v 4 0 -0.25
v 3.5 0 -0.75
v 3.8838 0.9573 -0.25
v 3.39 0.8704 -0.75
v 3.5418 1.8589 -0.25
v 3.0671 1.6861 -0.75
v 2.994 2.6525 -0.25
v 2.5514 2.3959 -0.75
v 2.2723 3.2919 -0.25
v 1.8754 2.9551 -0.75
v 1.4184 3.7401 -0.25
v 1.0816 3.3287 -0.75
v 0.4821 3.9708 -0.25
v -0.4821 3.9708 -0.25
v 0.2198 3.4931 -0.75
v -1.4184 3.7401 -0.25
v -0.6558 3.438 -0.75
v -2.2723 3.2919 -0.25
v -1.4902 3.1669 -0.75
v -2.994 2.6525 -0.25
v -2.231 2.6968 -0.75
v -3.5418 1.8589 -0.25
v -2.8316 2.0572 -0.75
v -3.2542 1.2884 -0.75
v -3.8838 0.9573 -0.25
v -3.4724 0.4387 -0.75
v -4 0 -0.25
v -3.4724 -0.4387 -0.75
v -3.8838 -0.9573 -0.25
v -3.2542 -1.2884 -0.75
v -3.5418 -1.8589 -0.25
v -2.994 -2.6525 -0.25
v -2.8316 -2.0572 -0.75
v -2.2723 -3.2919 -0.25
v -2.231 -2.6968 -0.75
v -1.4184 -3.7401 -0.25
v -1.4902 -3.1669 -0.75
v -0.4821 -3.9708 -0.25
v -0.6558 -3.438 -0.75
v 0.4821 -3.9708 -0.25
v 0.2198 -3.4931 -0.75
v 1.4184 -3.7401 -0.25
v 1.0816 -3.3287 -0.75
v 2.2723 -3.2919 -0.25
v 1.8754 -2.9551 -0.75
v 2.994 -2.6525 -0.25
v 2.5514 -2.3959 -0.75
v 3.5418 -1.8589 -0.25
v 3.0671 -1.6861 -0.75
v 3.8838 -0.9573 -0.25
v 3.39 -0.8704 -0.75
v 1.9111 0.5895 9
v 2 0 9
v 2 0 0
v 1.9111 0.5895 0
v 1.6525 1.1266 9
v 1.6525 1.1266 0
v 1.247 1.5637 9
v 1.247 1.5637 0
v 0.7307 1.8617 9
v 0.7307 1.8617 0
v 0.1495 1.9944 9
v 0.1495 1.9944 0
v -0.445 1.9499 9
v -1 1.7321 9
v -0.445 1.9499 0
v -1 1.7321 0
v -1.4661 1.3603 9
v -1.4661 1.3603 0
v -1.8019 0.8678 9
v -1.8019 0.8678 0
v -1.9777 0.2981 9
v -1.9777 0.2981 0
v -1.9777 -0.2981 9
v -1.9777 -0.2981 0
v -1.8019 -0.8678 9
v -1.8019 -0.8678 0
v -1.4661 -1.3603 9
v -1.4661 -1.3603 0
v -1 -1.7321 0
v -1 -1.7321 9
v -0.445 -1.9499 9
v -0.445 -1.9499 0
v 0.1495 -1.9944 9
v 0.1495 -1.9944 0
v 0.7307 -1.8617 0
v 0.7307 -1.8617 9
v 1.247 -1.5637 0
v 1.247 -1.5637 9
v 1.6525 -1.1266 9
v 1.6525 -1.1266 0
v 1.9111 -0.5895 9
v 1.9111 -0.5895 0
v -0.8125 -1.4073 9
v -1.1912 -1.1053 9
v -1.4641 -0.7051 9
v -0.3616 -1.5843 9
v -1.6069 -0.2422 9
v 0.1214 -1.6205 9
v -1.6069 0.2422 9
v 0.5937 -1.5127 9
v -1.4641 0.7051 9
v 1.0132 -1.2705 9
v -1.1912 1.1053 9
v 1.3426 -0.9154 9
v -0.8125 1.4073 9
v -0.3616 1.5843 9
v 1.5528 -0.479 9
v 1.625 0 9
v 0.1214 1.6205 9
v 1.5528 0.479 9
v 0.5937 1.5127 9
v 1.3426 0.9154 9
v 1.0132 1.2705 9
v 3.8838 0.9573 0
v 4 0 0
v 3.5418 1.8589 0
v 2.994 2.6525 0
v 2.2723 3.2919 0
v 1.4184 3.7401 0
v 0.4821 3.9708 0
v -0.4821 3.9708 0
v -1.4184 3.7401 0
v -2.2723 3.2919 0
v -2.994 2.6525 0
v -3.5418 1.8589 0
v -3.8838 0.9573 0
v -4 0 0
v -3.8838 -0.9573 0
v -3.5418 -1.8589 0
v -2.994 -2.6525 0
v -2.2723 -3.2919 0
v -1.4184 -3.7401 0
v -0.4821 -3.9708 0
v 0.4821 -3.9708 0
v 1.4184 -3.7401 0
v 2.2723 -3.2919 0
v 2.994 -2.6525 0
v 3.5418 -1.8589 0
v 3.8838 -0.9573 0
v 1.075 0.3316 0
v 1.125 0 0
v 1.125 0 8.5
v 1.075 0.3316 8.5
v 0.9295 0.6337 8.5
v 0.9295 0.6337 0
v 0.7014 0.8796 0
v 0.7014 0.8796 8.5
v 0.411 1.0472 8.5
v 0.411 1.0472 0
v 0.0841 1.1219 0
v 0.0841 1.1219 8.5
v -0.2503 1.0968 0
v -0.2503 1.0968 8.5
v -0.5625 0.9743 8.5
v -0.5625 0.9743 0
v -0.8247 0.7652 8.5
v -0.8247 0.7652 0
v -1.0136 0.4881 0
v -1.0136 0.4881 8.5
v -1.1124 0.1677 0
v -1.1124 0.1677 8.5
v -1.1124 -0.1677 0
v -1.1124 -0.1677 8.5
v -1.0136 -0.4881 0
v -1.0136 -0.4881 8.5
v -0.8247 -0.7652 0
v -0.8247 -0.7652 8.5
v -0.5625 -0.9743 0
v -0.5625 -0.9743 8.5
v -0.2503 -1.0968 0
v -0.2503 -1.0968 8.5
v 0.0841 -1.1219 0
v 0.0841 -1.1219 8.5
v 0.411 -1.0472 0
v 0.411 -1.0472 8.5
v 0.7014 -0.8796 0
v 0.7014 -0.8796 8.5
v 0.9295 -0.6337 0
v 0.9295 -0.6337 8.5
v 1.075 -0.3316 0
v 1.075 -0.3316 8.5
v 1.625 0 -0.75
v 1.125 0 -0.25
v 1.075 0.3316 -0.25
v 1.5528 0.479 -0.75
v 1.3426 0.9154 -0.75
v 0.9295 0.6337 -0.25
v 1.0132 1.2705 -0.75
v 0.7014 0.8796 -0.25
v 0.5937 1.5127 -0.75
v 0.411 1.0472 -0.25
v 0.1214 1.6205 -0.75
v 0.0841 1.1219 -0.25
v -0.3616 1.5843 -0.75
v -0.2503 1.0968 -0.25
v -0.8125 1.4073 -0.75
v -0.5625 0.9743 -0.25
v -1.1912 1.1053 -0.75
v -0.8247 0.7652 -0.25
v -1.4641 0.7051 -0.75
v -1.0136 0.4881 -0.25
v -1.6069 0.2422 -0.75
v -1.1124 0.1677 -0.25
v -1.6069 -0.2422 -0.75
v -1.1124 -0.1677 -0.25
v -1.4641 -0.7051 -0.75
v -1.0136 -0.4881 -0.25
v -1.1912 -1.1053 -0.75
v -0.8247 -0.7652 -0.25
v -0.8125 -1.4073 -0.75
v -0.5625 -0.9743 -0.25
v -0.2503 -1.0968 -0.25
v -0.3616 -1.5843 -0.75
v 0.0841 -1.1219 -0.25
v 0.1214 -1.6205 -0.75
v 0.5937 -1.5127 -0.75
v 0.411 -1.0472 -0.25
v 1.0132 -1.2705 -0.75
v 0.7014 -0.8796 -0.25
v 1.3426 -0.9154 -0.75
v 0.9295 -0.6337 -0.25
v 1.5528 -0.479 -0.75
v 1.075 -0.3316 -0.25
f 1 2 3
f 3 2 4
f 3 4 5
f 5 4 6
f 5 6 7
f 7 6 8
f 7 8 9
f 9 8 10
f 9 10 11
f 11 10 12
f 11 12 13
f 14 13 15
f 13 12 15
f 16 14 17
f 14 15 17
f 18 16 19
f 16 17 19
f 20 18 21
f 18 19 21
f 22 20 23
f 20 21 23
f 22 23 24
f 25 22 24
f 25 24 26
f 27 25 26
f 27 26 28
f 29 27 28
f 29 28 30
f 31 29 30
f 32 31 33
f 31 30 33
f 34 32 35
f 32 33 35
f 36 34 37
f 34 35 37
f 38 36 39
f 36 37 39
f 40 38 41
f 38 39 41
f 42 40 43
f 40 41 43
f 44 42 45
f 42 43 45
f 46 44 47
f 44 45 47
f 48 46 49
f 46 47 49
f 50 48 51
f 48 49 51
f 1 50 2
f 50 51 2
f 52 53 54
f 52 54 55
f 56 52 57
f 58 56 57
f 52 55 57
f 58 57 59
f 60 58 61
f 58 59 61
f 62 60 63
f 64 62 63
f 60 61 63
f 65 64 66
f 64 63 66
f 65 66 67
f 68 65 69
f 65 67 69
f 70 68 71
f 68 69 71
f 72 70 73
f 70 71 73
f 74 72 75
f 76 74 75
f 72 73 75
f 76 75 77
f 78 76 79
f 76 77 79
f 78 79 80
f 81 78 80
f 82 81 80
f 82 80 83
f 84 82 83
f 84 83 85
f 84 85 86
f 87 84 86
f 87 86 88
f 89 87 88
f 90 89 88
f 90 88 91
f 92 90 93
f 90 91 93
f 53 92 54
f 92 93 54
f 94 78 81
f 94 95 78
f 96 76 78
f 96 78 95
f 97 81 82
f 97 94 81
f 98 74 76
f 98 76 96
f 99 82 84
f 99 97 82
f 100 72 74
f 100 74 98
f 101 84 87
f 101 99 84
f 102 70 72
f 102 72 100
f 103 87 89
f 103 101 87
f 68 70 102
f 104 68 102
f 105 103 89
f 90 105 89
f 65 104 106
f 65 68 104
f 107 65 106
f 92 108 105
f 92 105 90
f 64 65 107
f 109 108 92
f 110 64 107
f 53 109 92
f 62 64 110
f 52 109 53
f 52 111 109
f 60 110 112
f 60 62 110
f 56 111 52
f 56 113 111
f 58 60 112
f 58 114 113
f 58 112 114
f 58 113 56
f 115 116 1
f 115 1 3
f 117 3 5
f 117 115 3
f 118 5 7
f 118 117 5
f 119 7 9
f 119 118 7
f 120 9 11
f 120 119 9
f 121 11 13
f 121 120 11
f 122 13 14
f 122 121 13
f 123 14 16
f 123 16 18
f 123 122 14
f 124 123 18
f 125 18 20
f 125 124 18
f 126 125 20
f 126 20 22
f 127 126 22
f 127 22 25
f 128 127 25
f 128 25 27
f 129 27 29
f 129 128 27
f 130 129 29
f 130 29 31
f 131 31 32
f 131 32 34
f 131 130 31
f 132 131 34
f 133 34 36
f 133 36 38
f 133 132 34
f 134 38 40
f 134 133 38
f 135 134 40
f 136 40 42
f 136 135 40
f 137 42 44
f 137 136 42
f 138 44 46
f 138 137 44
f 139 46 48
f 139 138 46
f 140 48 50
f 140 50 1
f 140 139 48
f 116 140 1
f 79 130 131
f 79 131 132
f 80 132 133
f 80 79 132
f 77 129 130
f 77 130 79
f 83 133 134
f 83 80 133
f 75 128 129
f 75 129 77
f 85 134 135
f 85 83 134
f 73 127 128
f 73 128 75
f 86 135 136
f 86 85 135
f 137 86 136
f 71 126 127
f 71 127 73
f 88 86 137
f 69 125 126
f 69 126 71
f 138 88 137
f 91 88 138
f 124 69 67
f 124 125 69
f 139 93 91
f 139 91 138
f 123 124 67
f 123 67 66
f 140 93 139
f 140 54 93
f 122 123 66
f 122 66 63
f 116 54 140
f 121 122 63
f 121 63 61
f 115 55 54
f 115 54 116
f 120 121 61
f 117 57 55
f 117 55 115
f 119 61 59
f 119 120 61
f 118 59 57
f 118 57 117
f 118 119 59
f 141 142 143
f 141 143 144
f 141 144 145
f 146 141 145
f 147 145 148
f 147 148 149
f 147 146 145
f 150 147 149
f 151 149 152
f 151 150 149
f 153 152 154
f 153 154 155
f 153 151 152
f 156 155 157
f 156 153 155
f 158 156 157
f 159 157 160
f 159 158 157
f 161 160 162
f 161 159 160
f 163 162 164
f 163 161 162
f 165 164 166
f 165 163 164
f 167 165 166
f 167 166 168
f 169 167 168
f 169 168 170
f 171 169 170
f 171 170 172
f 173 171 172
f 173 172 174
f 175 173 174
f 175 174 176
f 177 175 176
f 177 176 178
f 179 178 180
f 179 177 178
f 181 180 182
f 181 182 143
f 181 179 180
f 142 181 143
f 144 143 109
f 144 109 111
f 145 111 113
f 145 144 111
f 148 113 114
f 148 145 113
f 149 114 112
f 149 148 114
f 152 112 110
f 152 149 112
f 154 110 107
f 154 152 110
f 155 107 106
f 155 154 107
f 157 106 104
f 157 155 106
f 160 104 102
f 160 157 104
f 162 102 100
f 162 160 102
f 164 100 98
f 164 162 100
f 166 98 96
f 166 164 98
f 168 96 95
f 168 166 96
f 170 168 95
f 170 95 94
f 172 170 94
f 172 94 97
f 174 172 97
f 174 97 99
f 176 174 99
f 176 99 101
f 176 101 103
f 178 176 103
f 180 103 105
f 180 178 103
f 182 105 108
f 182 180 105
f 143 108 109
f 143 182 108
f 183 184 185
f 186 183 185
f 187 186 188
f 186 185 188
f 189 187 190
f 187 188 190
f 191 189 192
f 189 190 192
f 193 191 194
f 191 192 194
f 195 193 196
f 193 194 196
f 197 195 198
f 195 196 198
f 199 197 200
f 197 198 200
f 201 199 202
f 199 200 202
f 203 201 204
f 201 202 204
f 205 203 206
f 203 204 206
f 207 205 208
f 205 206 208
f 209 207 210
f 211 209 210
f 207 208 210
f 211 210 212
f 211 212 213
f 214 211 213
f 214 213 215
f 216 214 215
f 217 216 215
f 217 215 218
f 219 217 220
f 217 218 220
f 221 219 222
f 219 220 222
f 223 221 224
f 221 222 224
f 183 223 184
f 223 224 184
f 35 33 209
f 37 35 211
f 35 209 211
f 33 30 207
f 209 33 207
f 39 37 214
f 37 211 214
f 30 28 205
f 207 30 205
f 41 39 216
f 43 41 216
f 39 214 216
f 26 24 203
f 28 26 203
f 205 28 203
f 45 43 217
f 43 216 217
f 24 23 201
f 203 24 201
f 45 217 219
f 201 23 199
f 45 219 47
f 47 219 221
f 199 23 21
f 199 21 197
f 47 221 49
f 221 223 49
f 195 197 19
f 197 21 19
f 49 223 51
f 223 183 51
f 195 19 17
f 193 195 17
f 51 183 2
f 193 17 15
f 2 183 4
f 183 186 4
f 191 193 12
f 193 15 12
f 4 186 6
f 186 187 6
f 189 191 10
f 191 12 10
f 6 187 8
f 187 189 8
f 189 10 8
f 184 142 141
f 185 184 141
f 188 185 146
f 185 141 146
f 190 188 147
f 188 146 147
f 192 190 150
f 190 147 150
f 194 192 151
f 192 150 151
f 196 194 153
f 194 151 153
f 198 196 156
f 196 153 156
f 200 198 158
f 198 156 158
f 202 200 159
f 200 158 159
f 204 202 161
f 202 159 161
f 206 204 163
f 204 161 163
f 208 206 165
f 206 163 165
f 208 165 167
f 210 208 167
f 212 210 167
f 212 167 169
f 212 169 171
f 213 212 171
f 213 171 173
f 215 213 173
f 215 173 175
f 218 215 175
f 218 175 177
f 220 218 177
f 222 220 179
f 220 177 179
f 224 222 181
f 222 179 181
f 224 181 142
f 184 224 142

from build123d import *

# Parameters (mm, degrees)
F0_R     = 2
F0_R_2   = 1.125
F1_DEPTH = 9
F0_R_3   = 4
F2_DEPTH = 0.75
F3_SIZE  = 0.5


with BuildPart() as f1:
    # F0 (on Top) → F1 (new body)
    with BuildSketch(Plane.XY):
        Circle(F0_R)
        Circle(F0_R_2, mode=Mode.SUBTRACT)
    extrude(amount=F1_DEPTH)

    # F0 (on Top) → F2 (join)
    with BuildSketch(Plane.XY):
        Circle(F0_R_3)
        Circle(F0_R, mode=Mode.SUBTRACT)
        Circle(F0_R)
        Circle(F0_R_2, mode=Mode.SUBTRACT)
    extrude(amount=-F2_DEPTH)

    # F3
    f3_edges = [f1.edges().sort_by_distance(p)[0] for p in [
        (-1.125, 0, 9),
        (1.125, 0, 4.125),
        (-1.125, 0, -0.75),
        (-4, 0, -0.75),
    ]]
    chamfer(f3_edges, length=F3_SIZE)


solid = f1.part
